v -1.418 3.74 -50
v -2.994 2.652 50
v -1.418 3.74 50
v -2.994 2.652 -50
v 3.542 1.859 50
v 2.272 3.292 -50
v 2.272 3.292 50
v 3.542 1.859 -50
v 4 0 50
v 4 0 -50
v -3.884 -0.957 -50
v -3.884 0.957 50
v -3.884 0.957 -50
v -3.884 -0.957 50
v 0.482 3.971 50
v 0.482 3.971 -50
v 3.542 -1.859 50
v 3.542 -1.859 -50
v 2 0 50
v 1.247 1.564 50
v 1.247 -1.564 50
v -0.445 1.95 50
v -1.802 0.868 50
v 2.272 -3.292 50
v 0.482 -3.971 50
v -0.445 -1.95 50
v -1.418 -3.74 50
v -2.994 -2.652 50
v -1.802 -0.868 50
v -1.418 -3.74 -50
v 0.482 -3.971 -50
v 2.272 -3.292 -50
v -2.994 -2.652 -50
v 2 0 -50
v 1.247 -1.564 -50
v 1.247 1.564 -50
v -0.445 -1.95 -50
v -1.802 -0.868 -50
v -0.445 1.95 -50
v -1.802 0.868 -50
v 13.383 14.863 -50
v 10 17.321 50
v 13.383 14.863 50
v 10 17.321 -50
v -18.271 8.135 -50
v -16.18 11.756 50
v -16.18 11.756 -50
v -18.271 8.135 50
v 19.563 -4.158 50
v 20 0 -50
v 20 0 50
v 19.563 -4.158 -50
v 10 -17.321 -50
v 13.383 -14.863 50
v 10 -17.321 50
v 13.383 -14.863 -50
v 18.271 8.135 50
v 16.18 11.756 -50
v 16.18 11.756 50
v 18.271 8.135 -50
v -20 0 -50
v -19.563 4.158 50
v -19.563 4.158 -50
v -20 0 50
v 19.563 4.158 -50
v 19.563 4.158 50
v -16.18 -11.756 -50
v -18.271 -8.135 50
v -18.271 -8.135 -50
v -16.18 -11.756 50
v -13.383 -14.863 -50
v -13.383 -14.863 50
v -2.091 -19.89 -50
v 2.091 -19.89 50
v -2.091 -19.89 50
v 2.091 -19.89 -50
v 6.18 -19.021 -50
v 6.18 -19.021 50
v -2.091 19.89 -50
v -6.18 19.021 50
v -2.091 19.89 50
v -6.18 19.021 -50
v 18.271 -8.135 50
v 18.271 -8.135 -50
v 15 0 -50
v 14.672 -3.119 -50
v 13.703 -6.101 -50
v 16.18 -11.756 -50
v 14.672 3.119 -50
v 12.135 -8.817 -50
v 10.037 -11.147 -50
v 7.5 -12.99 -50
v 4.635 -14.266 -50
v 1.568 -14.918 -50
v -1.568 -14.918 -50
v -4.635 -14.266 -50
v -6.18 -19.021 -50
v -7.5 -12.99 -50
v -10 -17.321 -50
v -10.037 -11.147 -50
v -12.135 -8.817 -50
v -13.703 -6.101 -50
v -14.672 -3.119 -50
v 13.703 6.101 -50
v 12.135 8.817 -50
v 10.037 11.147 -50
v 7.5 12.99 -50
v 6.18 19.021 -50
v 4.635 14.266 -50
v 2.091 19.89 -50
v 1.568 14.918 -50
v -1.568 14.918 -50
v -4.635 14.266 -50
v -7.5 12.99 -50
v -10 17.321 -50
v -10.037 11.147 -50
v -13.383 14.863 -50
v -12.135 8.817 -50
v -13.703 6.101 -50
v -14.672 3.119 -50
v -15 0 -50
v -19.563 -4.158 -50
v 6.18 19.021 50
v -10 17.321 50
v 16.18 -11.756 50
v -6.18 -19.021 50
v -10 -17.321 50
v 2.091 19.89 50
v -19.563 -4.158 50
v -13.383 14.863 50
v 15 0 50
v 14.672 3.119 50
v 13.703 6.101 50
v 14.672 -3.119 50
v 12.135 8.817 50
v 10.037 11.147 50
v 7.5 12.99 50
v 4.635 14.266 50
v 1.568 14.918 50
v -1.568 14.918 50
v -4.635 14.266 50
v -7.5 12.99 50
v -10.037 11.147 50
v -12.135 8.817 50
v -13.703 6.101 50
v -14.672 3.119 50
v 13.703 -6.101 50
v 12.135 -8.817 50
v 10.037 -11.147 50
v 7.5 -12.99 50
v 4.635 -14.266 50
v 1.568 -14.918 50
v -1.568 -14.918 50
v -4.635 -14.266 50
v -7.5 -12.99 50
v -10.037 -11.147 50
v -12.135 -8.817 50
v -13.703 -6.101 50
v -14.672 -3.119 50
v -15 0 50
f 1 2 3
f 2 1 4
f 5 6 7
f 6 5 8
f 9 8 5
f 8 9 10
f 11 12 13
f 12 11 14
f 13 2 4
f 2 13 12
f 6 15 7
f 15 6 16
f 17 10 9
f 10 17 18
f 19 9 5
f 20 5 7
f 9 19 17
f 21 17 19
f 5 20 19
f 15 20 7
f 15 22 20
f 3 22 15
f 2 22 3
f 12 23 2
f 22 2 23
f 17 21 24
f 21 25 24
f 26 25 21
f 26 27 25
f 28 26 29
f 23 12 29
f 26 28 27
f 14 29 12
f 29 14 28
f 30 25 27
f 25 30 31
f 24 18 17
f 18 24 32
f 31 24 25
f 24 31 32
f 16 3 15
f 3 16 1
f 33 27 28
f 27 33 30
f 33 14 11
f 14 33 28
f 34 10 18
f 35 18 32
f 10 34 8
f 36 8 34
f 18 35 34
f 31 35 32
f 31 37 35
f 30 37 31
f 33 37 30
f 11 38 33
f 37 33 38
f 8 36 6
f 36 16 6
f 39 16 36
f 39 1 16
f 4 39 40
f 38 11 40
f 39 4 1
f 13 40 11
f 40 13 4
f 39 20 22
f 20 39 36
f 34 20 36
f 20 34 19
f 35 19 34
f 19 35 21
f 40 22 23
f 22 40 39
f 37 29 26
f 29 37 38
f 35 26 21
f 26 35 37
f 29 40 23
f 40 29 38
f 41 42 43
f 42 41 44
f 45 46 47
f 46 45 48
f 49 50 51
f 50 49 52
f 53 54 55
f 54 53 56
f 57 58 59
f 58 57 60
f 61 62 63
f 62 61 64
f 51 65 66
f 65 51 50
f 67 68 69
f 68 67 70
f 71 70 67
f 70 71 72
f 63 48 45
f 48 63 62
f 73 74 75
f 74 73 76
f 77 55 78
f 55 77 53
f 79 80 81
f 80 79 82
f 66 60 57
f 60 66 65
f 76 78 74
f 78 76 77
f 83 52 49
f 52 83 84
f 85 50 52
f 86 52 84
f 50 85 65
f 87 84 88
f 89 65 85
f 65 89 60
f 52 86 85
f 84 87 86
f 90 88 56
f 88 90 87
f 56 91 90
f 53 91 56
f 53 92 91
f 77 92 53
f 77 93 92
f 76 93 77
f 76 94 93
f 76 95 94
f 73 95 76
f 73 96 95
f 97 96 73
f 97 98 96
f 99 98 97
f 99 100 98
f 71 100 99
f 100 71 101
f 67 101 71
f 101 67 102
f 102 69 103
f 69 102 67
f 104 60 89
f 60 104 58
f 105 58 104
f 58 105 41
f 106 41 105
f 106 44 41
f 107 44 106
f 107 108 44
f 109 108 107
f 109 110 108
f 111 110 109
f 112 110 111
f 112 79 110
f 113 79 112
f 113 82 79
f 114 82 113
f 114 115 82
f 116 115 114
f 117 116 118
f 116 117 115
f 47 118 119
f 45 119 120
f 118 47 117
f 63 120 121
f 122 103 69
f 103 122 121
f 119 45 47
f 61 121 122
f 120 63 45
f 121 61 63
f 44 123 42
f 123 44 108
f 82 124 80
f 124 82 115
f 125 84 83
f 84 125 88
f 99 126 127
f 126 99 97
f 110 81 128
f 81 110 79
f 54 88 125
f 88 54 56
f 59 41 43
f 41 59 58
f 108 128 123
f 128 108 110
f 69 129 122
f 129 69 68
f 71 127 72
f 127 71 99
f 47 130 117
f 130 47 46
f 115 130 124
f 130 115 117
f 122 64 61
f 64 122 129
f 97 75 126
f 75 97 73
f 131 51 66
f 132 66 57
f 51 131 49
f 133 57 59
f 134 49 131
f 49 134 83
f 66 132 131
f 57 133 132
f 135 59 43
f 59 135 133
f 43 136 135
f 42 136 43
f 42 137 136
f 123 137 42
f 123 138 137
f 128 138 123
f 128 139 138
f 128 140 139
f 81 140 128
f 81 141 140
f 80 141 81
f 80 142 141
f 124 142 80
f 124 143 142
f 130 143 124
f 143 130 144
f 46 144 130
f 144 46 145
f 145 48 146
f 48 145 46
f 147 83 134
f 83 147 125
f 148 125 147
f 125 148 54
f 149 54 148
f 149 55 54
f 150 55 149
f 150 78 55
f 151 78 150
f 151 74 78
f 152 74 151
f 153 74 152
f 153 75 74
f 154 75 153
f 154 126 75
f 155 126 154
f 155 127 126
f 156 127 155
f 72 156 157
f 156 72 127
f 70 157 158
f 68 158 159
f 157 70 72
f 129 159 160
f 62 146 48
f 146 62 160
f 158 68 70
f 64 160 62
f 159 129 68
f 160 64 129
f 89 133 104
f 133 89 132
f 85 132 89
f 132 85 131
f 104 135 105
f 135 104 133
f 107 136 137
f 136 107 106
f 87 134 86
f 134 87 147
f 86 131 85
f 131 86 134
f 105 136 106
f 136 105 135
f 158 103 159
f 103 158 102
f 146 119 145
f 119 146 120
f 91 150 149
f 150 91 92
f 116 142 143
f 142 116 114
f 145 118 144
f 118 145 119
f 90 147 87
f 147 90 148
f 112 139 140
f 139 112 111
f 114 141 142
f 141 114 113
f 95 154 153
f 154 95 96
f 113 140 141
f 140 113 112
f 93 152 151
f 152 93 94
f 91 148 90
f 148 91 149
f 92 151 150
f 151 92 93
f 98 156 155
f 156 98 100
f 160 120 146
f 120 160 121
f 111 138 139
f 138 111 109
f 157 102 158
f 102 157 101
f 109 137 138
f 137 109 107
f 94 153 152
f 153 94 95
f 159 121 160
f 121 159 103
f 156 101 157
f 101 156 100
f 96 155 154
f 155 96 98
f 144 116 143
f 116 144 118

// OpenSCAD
// file: lib.scad
// See http://en.wikibooks.org/wiki/OpenSCAD_User_Manual/Include_Statement

module pipe(r1, r2, h) {
    difference() {
        cylinder(r=r1, h=h, center=true);
        cylinder(r=r2, h=h+1, center=true);
    }
}

// Following commands are called with "include" but not with "use"

echo("Printed with include but not with use");

pipe(4, 2, 100);
// main file
// See http://en.wikibooks.org/wiki/OpenSCAD_User_Manual/Include_Statement

// preview: F5
// compile and render: F6

include <lib.scad>

pipe(20, 15, 100);
